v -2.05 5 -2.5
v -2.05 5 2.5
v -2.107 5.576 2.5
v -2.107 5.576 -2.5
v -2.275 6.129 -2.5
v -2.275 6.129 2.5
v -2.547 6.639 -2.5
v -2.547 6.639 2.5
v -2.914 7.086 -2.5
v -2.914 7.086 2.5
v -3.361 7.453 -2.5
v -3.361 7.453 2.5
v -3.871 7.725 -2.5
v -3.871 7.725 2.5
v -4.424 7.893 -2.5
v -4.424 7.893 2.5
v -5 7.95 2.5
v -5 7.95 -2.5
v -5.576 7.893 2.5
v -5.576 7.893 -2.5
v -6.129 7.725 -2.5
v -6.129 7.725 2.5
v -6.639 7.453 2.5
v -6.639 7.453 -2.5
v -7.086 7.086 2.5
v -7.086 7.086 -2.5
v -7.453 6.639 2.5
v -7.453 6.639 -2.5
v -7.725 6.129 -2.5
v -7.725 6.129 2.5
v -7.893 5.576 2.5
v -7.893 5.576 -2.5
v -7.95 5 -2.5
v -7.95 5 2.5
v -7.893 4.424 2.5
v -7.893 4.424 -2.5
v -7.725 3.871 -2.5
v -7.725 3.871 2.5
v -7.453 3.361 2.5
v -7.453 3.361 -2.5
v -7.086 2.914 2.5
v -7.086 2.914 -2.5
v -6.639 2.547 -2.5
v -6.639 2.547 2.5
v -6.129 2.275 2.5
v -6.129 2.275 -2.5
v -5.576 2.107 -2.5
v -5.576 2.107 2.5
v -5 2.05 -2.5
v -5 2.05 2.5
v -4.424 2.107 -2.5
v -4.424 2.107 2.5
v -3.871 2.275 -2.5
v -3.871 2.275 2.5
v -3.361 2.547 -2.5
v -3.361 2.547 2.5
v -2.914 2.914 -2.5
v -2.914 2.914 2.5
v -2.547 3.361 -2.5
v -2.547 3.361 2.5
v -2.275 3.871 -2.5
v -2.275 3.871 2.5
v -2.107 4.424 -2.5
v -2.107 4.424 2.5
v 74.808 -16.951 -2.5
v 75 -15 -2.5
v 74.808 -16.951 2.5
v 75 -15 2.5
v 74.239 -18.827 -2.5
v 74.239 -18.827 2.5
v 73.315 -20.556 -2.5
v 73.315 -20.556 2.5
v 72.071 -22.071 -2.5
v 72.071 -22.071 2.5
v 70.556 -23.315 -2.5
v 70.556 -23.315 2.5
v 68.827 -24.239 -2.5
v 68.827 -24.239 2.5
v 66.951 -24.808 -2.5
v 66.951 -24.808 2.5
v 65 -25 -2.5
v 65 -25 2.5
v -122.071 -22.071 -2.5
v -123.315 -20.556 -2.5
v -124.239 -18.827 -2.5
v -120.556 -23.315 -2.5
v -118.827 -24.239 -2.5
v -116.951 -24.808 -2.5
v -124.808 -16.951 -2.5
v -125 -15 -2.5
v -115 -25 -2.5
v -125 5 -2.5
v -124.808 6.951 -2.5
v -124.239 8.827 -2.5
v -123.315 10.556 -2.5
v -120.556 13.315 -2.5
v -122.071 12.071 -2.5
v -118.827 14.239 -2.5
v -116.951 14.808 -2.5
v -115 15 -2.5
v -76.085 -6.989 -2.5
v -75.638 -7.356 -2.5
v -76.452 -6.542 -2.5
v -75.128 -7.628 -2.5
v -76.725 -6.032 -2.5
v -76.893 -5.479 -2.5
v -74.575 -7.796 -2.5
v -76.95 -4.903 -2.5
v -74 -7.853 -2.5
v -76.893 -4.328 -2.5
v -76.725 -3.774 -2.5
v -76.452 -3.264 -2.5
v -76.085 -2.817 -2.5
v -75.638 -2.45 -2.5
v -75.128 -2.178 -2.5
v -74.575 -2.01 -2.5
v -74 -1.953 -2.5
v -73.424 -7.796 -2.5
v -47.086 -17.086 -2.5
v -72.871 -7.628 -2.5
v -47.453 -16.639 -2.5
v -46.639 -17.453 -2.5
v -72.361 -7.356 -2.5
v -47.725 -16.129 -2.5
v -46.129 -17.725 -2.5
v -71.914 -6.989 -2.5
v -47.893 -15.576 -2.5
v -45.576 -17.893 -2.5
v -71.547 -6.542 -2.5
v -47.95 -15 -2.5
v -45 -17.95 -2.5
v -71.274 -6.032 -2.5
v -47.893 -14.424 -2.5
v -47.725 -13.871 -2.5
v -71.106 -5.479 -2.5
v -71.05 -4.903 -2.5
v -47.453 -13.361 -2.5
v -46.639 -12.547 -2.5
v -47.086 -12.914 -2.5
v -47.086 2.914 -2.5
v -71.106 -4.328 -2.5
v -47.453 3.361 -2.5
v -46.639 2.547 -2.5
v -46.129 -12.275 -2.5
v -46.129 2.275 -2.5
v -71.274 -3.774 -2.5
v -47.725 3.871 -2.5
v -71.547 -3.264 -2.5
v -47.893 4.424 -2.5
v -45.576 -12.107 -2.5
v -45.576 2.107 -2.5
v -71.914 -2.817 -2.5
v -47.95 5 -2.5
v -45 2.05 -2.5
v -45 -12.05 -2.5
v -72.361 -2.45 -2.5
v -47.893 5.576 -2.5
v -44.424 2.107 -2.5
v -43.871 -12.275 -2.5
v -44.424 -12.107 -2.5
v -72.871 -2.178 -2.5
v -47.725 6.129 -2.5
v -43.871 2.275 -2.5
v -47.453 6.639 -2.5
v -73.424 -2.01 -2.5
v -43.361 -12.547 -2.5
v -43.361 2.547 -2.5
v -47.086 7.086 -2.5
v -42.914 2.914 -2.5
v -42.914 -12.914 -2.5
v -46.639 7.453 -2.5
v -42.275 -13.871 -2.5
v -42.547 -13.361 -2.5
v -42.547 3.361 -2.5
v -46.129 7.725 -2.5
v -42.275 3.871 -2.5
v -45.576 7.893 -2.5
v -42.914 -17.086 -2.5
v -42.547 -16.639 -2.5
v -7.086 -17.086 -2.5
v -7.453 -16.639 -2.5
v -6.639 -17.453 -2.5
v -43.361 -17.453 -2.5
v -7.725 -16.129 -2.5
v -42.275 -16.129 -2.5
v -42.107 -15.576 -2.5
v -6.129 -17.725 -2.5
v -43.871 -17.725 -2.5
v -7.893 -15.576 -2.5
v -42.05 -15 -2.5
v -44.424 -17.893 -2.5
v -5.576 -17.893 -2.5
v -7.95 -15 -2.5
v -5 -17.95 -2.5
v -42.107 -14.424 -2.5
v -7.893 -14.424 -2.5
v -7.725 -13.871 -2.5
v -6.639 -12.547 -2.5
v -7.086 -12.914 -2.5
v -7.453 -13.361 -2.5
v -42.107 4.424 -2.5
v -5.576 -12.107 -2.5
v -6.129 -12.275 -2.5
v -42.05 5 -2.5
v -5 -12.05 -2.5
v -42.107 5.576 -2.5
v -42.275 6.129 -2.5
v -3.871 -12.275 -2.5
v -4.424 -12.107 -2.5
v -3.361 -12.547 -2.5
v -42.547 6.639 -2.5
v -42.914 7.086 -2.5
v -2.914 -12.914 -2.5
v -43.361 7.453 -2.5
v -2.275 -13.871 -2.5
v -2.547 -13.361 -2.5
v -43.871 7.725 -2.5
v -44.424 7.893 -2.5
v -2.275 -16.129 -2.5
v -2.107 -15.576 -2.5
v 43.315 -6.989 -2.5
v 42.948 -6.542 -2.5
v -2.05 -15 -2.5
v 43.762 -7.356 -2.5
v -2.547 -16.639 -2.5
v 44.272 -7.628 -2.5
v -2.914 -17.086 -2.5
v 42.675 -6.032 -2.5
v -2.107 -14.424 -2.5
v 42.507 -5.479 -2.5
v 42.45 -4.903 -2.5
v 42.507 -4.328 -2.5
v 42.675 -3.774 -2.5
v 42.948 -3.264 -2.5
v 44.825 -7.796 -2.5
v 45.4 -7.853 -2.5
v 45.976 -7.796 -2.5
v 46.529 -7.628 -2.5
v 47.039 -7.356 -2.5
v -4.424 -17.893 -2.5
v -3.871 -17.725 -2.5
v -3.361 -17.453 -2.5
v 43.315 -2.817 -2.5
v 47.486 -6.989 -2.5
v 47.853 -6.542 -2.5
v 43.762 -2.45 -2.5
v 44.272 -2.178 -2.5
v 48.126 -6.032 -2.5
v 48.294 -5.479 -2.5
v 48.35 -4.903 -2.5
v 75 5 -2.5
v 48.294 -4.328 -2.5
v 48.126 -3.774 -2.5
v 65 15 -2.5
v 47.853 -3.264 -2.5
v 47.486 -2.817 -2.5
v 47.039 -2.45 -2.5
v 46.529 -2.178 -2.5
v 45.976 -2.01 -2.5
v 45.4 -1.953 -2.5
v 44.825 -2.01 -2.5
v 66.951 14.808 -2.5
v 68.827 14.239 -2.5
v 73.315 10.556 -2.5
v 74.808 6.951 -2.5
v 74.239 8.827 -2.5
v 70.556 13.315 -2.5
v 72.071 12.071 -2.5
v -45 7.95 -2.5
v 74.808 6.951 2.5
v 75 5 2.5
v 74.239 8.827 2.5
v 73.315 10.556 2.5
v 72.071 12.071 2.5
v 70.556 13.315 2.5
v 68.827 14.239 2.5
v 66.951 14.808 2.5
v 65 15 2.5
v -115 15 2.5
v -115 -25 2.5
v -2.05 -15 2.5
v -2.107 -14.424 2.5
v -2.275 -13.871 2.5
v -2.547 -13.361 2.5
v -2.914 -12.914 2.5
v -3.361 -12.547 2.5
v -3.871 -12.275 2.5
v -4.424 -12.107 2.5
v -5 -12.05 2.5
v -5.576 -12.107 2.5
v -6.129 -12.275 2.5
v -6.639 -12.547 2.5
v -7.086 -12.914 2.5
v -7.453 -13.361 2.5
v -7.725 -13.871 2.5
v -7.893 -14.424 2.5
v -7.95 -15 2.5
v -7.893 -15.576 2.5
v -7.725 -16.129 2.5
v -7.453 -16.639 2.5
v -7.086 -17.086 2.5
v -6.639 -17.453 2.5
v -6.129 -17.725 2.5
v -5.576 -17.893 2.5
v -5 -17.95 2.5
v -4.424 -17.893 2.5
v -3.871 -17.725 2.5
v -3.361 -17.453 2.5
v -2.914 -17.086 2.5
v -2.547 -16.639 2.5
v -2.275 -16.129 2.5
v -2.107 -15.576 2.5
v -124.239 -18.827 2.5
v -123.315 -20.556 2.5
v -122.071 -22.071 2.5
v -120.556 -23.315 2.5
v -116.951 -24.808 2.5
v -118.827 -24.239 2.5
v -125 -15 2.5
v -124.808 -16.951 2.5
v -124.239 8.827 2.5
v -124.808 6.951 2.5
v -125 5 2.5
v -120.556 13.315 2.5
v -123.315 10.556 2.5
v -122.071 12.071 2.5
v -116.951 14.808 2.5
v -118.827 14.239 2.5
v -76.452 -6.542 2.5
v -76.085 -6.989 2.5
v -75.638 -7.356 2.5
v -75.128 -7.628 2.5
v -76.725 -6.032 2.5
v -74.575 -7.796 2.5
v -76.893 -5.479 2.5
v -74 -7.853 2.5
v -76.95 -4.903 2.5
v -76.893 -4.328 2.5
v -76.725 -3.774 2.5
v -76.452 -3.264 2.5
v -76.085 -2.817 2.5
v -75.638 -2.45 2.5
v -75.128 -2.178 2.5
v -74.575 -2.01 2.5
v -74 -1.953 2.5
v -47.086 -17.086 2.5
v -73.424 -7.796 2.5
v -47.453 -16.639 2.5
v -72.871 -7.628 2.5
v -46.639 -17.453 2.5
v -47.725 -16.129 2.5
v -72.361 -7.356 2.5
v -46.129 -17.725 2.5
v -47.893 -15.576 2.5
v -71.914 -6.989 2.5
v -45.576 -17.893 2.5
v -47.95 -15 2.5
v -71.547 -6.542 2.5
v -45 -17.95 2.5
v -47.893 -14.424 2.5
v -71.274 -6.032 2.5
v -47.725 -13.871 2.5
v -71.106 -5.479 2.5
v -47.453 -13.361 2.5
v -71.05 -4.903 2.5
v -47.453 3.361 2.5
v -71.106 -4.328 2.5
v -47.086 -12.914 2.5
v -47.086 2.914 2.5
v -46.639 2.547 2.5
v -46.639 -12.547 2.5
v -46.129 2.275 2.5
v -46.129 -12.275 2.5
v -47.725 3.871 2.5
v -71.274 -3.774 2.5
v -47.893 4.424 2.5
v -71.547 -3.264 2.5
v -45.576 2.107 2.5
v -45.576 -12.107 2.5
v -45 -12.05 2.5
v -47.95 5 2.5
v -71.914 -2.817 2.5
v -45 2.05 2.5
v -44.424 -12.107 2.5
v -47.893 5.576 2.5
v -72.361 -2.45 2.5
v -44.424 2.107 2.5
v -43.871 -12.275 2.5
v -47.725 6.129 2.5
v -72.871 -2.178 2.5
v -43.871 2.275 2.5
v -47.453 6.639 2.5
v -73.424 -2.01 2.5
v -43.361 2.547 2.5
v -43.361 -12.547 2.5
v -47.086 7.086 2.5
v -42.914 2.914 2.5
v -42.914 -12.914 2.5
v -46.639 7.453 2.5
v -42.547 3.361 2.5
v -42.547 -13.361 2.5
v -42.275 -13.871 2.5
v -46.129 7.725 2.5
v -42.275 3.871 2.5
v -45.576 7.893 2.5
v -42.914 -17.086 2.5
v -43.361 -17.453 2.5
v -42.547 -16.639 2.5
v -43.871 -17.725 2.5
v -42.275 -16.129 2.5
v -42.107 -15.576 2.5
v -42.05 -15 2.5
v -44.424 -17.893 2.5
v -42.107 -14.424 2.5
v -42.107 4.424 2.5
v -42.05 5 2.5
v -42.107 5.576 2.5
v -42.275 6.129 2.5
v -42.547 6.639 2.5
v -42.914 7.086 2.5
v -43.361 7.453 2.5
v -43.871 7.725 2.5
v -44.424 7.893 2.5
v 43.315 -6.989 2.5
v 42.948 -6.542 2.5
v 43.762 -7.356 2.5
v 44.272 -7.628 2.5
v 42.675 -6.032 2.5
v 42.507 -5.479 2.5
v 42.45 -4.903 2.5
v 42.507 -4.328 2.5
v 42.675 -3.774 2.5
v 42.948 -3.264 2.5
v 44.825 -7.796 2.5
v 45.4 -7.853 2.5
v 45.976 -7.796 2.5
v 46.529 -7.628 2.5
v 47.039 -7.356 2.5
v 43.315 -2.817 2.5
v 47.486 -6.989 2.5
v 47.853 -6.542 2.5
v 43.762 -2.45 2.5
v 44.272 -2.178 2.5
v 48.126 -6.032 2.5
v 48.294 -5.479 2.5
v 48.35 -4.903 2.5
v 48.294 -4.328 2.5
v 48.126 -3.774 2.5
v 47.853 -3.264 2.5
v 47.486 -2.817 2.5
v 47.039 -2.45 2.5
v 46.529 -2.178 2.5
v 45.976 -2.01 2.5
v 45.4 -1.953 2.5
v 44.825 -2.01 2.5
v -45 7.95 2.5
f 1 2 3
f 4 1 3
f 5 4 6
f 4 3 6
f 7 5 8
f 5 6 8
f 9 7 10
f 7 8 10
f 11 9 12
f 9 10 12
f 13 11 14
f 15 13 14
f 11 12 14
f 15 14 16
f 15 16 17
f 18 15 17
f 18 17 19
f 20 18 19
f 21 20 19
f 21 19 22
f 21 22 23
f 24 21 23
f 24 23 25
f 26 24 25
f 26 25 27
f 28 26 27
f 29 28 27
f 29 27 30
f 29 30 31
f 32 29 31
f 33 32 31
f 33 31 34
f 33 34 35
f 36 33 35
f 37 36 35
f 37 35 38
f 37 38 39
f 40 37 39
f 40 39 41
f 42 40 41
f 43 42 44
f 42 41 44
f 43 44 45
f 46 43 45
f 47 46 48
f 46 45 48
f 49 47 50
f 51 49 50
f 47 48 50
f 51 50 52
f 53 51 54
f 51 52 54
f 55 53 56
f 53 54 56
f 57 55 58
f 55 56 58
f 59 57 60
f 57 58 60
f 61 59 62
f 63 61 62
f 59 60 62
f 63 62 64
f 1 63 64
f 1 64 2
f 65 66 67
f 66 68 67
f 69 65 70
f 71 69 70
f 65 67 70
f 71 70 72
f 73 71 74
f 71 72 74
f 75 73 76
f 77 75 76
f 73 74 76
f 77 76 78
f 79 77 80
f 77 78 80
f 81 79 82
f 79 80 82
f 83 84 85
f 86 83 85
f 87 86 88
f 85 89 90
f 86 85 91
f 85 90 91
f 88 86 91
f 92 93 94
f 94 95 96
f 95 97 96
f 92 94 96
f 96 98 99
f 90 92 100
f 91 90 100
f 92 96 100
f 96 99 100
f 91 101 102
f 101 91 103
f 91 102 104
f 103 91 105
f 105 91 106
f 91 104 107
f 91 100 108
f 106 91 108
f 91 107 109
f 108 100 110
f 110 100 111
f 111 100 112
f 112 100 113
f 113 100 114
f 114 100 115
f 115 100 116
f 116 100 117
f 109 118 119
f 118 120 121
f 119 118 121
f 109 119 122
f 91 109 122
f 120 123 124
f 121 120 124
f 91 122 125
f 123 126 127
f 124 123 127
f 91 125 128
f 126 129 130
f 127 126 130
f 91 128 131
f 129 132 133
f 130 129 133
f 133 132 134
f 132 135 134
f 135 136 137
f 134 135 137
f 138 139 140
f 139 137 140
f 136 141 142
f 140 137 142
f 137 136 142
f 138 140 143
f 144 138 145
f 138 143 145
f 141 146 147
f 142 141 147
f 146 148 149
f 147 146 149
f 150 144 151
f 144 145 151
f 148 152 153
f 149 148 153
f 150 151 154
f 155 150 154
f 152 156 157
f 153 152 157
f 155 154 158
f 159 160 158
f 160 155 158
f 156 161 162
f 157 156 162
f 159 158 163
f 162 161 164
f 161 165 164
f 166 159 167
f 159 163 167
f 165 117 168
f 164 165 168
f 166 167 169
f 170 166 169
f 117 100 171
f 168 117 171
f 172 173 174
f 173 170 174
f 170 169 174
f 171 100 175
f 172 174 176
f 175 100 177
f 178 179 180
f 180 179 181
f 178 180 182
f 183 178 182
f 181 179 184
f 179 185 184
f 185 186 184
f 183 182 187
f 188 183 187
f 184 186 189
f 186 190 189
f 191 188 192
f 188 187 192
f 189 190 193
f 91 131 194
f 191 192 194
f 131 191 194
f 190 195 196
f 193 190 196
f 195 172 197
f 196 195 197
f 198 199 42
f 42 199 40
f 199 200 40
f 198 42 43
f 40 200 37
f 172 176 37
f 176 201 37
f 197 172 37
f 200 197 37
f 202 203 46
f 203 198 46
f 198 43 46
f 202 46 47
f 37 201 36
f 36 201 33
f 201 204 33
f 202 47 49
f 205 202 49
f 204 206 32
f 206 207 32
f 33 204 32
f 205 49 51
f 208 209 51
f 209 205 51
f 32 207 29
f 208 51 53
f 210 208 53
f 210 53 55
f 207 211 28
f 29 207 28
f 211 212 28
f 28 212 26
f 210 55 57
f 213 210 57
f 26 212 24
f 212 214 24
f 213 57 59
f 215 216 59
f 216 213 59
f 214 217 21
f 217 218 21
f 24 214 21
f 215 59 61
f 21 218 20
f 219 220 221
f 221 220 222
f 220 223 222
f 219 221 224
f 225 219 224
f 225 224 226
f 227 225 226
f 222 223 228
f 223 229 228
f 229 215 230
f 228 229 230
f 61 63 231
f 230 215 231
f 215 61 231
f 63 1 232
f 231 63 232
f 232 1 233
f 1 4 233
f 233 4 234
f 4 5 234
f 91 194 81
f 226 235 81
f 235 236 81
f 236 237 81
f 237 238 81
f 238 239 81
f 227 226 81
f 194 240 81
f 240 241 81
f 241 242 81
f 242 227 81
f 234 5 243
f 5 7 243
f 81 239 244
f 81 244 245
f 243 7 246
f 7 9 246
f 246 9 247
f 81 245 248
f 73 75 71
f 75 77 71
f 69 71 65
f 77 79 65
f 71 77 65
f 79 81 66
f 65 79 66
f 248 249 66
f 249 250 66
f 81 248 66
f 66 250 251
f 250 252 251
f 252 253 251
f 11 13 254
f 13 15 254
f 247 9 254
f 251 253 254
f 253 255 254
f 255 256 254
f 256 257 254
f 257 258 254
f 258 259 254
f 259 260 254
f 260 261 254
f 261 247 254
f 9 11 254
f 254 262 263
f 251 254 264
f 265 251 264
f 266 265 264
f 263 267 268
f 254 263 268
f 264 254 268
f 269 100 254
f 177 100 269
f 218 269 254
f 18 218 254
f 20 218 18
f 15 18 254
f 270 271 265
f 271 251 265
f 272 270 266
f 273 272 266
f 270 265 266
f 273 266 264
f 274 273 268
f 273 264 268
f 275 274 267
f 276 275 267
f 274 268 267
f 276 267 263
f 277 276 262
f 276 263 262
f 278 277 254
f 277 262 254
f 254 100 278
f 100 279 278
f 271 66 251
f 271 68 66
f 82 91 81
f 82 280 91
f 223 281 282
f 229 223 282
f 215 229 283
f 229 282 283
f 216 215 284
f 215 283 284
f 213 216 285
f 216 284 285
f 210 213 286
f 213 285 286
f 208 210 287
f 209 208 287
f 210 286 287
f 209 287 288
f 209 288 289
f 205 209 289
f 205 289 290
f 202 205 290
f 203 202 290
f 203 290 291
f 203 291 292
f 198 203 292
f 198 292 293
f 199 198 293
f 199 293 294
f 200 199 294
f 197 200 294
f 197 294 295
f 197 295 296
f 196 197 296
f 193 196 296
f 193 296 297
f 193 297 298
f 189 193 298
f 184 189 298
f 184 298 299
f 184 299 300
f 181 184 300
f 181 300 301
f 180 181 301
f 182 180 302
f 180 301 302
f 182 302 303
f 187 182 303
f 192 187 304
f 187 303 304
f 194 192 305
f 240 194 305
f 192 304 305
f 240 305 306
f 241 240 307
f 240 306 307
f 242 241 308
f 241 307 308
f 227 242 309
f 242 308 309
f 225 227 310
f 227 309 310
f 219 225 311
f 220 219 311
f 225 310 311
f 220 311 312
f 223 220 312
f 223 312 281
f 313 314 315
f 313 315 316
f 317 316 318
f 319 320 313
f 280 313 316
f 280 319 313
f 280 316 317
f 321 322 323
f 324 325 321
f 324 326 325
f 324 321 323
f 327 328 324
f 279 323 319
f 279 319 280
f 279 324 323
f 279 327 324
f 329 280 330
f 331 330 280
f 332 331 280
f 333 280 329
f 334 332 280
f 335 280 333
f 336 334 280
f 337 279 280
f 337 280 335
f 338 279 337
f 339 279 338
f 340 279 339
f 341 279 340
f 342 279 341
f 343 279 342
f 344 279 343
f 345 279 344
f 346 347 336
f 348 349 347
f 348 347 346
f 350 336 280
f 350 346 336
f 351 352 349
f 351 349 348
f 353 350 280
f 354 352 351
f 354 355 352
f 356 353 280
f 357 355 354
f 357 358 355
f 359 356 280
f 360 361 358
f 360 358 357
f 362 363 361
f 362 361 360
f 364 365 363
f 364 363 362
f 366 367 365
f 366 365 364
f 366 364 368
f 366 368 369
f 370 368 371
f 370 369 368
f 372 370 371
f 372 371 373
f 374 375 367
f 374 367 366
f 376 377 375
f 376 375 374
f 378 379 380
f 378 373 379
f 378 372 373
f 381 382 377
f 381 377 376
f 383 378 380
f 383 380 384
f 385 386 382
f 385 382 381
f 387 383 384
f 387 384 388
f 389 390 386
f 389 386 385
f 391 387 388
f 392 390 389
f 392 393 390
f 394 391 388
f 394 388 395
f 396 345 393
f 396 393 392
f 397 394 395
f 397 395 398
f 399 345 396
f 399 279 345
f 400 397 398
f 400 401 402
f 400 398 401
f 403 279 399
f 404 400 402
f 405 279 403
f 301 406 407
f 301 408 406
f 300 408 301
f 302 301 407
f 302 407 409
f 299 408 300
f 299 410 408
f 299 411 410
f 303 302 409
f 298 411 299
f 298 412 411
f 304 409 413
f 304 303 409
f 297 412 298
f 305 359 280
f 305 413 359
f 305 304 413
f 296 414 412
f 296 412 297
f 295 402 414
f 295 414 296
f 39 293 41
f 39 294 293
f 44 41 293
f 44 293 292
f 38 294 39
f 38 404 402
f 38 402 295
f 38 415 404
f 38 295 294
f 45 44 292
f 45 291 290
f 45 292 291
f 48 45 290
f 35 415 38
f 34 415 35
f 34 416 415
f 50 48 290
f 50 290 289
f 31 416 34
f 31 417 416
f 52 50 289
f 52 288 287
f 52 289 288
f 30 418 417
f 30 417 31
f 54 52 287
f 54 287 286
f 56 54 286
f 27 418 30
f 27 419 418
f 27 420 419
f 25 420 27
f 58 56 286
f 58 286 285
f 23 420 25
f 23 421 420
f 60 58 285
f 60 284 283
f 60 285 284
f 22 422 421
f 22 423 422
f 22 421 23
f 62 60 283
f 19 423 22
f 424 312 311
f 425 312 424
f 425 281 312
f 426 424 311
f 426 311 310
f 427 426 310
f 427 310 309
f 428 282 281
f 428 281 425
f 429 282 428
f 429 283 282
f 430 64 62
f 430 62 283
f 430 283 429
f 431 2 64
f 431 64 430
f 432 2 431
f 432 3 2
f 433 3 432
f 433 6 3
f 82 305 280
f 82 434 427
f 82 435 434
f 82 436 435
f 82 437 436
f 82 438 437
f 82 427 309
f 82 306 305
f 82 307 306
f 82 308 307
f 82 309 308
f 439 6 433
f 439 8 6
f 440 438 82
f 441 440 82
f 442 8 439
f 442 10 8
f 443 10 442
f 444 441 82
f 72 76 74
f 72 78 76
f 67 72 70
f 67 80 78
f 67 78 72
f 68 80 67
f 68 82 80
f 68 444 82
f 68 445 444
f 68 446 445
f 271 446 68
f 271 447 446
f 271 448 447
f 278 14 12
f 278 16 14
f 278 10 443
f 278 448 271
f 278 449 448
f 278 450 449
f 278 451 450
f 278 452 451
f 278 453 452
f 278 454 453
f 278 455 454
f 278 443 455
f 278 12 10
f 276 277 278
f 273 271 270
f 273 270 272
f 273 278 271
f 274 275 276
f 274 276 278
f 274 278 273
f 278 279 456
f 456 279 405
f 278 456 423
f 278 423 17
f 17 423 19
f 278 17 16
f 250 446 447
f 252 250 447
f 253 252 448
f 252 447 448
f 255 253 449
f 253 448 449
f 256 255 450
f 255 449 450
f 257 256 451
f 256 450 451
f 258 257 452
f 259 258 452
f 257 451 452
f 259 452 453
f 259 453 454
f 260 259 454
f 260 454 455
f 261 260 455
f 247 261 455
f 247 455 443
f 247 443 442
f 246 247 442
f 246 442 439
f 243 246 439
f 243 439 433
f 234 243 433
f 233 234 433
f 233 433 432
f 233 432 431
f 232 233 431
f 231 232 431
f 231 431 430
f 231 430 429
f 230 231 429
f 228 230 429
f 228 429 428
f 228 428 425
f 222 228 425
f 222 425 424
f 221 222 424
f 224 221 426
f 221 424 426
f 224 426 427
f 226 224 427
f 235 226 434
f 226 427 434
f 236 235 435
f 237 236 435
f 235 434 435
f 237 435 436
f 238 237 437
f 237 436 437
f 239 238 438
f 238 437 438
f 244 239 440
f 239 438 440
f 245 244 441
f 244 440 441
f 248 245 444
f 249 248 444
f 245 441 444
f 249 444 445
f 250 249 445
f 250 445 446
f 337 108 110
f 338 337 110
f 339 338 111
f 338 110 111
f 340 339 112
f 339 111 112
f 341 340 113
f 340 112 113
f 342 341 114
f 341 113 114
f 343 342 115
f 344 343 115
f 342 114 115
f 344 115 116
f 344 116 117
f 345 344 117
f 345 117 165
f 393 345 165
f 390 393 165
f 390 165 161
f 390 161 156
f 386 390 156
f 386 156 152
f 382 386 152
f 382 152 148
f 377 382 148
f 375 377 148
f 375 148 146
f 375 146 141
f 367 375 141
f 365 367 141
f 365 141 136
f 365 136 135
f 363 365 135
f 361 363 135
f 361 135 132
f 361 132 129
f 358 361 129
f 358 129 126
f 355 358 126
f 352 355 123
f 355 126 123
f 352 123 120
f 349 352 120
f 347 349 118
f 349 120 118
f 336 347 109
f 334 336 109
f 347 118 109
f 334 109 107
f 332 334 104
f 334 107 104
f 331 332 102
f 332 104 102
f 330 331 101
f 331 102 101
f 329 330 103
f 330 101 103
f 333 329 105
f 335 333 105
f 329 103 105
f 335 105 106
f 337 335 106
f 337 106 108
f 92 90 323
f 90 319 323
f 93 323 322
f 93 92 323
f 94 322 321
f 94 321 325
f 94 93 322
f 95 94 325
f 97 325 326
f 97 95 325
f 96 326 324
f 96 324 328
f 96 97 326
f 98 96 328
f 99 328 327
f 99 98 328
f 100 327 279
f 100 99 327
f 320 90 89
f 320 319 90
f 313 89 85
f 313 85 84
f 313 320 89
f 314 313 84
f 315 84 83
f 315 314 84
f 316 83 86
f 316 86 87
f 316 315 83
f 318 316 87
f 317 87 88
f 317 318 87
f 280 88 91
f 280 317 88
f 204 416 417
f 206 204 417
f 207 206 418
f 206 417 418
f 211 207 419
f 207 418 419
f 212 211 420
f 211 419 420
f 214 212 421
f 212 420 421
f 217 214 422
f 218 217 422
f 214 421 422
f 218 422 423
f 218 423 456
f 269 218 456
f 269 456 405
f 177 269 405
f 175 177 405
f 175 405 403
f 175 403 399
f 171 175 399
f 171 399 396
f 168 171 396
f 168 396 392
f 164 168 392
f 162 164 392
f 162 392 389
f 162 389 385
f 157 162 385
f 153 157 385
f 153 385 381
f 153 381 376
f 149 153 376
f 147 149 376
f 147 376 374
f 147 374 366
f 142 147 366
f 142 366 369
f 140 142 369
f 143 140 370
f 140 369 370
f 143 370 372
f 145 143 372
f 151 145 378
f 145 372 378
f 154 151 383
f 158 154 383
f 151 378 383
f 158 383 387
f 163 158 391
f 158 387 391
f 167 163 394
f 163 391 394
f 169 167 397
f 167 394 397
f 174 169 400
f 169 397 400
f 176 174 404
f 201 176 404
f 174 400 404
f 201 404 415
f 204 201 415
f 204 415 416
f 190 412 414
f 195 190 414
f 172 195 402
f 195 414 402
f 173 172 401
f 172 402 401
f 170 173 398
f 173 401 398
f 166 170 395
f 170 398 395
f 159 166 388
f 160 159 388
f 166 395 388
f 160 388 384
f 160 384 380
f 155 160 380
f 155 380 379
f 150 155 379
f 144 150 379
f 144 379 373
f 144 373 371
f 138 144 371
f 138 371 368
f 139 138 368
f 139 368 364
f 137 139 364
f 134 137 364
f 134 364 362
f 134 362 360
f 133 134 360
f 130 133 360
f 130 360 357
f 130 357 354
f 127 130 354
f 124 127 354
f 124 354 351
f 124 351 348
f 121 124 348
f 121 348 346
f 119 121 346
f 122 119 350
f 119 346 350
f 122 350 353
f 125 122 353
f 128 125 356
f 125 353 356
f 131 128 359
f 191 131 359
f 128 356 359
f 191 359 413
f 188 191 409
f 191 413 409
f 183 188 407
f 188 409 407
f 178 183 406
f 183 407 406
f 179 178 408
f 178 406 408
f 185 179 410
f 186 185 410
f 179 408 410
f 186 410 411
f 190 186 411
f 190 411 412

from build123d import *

# Parameters (mm, degrees)
CROQUIS1_W            = 200
CROQUIS1_H            = 40
EXTRUIR1_DEPTH        = 2.5
REDONDEO1_R           = 10
CROQUIS2_R            = 2.95
CORTAR_EXTRUIR1_DEPTH = 10
CROQUIS3_R            = 2.95
CORTAR_EXTRUIR2_DEPTH = 10
CROQUIS4_R            = 2.95
CORTAR_EXTRUIR3_DEPTH = 10


with BuildPart() as part:
    # Croquis1 → Extruir1 (new, symmetric)
    with BuildSketch(Plane.XY):
        with Locations((-25, -5)):
            Rectangle(CROQUIS1_W, CROQUIS1_H)
    extrude(amount=EXTRUIR1_DEPTH, both=True)

    # Redondeo1
    redondeo1_edges = [part.edges().sort_by_distance(p)[0] for p in [
        (75, 15, 0),
        (75, -25, 0),
        (-125, -25, 0),
        (-125, 15, 0),
    ]]
    fillet(redondeo1_edges, radius=REDONDEO1_R)

    # Croquis2 → Cortar-Extruir1 (cut)
    with BuildSketch(Plane(origin=(0, 0, -2.5), x_dir=(-1, 0, 0), z_dir=(0, 0, -1))):
        with Locations((73.999510292, -4.90303525)):
            Circle(CROQUIS2_R)
    extrude(amount=-CORTAR_EXTRUIR1_DEPTH, mode=Mode.SUBTRACT)

    # Croquis3 → Cortar-Extruir2 (cut)
    with BuildSketch(Plane.XY.offset(2.5)):
        with Locations((-45, 5)):
            Circle(CROQUIS3_R)
        with Locations((-5, 5)):
            Circle(CROQUIS3_R)
        with Locations((-45, -15)):
            Circle(CROQUIS3_R)
        with Locations((-5, -15)):
            Circle(CROQUIS3_R)
    extrude(amount=-CORTAR_EXTRUIR2_DEPTH, mode=Mode.SUBTRACT)

    # Croquis4 → Cortar-Extruir3 (cut)
    with BuildSketch(Plane.XY.offset(2.5)):
        with Locations((45.400489708, -4.90303525)):
            Circle(CROQUIS4_R)
    extrude(amount=-CORTAR_EXTRUIR3_DEPTH, mode=Mode.SUBTRACT)


solid = part.part
